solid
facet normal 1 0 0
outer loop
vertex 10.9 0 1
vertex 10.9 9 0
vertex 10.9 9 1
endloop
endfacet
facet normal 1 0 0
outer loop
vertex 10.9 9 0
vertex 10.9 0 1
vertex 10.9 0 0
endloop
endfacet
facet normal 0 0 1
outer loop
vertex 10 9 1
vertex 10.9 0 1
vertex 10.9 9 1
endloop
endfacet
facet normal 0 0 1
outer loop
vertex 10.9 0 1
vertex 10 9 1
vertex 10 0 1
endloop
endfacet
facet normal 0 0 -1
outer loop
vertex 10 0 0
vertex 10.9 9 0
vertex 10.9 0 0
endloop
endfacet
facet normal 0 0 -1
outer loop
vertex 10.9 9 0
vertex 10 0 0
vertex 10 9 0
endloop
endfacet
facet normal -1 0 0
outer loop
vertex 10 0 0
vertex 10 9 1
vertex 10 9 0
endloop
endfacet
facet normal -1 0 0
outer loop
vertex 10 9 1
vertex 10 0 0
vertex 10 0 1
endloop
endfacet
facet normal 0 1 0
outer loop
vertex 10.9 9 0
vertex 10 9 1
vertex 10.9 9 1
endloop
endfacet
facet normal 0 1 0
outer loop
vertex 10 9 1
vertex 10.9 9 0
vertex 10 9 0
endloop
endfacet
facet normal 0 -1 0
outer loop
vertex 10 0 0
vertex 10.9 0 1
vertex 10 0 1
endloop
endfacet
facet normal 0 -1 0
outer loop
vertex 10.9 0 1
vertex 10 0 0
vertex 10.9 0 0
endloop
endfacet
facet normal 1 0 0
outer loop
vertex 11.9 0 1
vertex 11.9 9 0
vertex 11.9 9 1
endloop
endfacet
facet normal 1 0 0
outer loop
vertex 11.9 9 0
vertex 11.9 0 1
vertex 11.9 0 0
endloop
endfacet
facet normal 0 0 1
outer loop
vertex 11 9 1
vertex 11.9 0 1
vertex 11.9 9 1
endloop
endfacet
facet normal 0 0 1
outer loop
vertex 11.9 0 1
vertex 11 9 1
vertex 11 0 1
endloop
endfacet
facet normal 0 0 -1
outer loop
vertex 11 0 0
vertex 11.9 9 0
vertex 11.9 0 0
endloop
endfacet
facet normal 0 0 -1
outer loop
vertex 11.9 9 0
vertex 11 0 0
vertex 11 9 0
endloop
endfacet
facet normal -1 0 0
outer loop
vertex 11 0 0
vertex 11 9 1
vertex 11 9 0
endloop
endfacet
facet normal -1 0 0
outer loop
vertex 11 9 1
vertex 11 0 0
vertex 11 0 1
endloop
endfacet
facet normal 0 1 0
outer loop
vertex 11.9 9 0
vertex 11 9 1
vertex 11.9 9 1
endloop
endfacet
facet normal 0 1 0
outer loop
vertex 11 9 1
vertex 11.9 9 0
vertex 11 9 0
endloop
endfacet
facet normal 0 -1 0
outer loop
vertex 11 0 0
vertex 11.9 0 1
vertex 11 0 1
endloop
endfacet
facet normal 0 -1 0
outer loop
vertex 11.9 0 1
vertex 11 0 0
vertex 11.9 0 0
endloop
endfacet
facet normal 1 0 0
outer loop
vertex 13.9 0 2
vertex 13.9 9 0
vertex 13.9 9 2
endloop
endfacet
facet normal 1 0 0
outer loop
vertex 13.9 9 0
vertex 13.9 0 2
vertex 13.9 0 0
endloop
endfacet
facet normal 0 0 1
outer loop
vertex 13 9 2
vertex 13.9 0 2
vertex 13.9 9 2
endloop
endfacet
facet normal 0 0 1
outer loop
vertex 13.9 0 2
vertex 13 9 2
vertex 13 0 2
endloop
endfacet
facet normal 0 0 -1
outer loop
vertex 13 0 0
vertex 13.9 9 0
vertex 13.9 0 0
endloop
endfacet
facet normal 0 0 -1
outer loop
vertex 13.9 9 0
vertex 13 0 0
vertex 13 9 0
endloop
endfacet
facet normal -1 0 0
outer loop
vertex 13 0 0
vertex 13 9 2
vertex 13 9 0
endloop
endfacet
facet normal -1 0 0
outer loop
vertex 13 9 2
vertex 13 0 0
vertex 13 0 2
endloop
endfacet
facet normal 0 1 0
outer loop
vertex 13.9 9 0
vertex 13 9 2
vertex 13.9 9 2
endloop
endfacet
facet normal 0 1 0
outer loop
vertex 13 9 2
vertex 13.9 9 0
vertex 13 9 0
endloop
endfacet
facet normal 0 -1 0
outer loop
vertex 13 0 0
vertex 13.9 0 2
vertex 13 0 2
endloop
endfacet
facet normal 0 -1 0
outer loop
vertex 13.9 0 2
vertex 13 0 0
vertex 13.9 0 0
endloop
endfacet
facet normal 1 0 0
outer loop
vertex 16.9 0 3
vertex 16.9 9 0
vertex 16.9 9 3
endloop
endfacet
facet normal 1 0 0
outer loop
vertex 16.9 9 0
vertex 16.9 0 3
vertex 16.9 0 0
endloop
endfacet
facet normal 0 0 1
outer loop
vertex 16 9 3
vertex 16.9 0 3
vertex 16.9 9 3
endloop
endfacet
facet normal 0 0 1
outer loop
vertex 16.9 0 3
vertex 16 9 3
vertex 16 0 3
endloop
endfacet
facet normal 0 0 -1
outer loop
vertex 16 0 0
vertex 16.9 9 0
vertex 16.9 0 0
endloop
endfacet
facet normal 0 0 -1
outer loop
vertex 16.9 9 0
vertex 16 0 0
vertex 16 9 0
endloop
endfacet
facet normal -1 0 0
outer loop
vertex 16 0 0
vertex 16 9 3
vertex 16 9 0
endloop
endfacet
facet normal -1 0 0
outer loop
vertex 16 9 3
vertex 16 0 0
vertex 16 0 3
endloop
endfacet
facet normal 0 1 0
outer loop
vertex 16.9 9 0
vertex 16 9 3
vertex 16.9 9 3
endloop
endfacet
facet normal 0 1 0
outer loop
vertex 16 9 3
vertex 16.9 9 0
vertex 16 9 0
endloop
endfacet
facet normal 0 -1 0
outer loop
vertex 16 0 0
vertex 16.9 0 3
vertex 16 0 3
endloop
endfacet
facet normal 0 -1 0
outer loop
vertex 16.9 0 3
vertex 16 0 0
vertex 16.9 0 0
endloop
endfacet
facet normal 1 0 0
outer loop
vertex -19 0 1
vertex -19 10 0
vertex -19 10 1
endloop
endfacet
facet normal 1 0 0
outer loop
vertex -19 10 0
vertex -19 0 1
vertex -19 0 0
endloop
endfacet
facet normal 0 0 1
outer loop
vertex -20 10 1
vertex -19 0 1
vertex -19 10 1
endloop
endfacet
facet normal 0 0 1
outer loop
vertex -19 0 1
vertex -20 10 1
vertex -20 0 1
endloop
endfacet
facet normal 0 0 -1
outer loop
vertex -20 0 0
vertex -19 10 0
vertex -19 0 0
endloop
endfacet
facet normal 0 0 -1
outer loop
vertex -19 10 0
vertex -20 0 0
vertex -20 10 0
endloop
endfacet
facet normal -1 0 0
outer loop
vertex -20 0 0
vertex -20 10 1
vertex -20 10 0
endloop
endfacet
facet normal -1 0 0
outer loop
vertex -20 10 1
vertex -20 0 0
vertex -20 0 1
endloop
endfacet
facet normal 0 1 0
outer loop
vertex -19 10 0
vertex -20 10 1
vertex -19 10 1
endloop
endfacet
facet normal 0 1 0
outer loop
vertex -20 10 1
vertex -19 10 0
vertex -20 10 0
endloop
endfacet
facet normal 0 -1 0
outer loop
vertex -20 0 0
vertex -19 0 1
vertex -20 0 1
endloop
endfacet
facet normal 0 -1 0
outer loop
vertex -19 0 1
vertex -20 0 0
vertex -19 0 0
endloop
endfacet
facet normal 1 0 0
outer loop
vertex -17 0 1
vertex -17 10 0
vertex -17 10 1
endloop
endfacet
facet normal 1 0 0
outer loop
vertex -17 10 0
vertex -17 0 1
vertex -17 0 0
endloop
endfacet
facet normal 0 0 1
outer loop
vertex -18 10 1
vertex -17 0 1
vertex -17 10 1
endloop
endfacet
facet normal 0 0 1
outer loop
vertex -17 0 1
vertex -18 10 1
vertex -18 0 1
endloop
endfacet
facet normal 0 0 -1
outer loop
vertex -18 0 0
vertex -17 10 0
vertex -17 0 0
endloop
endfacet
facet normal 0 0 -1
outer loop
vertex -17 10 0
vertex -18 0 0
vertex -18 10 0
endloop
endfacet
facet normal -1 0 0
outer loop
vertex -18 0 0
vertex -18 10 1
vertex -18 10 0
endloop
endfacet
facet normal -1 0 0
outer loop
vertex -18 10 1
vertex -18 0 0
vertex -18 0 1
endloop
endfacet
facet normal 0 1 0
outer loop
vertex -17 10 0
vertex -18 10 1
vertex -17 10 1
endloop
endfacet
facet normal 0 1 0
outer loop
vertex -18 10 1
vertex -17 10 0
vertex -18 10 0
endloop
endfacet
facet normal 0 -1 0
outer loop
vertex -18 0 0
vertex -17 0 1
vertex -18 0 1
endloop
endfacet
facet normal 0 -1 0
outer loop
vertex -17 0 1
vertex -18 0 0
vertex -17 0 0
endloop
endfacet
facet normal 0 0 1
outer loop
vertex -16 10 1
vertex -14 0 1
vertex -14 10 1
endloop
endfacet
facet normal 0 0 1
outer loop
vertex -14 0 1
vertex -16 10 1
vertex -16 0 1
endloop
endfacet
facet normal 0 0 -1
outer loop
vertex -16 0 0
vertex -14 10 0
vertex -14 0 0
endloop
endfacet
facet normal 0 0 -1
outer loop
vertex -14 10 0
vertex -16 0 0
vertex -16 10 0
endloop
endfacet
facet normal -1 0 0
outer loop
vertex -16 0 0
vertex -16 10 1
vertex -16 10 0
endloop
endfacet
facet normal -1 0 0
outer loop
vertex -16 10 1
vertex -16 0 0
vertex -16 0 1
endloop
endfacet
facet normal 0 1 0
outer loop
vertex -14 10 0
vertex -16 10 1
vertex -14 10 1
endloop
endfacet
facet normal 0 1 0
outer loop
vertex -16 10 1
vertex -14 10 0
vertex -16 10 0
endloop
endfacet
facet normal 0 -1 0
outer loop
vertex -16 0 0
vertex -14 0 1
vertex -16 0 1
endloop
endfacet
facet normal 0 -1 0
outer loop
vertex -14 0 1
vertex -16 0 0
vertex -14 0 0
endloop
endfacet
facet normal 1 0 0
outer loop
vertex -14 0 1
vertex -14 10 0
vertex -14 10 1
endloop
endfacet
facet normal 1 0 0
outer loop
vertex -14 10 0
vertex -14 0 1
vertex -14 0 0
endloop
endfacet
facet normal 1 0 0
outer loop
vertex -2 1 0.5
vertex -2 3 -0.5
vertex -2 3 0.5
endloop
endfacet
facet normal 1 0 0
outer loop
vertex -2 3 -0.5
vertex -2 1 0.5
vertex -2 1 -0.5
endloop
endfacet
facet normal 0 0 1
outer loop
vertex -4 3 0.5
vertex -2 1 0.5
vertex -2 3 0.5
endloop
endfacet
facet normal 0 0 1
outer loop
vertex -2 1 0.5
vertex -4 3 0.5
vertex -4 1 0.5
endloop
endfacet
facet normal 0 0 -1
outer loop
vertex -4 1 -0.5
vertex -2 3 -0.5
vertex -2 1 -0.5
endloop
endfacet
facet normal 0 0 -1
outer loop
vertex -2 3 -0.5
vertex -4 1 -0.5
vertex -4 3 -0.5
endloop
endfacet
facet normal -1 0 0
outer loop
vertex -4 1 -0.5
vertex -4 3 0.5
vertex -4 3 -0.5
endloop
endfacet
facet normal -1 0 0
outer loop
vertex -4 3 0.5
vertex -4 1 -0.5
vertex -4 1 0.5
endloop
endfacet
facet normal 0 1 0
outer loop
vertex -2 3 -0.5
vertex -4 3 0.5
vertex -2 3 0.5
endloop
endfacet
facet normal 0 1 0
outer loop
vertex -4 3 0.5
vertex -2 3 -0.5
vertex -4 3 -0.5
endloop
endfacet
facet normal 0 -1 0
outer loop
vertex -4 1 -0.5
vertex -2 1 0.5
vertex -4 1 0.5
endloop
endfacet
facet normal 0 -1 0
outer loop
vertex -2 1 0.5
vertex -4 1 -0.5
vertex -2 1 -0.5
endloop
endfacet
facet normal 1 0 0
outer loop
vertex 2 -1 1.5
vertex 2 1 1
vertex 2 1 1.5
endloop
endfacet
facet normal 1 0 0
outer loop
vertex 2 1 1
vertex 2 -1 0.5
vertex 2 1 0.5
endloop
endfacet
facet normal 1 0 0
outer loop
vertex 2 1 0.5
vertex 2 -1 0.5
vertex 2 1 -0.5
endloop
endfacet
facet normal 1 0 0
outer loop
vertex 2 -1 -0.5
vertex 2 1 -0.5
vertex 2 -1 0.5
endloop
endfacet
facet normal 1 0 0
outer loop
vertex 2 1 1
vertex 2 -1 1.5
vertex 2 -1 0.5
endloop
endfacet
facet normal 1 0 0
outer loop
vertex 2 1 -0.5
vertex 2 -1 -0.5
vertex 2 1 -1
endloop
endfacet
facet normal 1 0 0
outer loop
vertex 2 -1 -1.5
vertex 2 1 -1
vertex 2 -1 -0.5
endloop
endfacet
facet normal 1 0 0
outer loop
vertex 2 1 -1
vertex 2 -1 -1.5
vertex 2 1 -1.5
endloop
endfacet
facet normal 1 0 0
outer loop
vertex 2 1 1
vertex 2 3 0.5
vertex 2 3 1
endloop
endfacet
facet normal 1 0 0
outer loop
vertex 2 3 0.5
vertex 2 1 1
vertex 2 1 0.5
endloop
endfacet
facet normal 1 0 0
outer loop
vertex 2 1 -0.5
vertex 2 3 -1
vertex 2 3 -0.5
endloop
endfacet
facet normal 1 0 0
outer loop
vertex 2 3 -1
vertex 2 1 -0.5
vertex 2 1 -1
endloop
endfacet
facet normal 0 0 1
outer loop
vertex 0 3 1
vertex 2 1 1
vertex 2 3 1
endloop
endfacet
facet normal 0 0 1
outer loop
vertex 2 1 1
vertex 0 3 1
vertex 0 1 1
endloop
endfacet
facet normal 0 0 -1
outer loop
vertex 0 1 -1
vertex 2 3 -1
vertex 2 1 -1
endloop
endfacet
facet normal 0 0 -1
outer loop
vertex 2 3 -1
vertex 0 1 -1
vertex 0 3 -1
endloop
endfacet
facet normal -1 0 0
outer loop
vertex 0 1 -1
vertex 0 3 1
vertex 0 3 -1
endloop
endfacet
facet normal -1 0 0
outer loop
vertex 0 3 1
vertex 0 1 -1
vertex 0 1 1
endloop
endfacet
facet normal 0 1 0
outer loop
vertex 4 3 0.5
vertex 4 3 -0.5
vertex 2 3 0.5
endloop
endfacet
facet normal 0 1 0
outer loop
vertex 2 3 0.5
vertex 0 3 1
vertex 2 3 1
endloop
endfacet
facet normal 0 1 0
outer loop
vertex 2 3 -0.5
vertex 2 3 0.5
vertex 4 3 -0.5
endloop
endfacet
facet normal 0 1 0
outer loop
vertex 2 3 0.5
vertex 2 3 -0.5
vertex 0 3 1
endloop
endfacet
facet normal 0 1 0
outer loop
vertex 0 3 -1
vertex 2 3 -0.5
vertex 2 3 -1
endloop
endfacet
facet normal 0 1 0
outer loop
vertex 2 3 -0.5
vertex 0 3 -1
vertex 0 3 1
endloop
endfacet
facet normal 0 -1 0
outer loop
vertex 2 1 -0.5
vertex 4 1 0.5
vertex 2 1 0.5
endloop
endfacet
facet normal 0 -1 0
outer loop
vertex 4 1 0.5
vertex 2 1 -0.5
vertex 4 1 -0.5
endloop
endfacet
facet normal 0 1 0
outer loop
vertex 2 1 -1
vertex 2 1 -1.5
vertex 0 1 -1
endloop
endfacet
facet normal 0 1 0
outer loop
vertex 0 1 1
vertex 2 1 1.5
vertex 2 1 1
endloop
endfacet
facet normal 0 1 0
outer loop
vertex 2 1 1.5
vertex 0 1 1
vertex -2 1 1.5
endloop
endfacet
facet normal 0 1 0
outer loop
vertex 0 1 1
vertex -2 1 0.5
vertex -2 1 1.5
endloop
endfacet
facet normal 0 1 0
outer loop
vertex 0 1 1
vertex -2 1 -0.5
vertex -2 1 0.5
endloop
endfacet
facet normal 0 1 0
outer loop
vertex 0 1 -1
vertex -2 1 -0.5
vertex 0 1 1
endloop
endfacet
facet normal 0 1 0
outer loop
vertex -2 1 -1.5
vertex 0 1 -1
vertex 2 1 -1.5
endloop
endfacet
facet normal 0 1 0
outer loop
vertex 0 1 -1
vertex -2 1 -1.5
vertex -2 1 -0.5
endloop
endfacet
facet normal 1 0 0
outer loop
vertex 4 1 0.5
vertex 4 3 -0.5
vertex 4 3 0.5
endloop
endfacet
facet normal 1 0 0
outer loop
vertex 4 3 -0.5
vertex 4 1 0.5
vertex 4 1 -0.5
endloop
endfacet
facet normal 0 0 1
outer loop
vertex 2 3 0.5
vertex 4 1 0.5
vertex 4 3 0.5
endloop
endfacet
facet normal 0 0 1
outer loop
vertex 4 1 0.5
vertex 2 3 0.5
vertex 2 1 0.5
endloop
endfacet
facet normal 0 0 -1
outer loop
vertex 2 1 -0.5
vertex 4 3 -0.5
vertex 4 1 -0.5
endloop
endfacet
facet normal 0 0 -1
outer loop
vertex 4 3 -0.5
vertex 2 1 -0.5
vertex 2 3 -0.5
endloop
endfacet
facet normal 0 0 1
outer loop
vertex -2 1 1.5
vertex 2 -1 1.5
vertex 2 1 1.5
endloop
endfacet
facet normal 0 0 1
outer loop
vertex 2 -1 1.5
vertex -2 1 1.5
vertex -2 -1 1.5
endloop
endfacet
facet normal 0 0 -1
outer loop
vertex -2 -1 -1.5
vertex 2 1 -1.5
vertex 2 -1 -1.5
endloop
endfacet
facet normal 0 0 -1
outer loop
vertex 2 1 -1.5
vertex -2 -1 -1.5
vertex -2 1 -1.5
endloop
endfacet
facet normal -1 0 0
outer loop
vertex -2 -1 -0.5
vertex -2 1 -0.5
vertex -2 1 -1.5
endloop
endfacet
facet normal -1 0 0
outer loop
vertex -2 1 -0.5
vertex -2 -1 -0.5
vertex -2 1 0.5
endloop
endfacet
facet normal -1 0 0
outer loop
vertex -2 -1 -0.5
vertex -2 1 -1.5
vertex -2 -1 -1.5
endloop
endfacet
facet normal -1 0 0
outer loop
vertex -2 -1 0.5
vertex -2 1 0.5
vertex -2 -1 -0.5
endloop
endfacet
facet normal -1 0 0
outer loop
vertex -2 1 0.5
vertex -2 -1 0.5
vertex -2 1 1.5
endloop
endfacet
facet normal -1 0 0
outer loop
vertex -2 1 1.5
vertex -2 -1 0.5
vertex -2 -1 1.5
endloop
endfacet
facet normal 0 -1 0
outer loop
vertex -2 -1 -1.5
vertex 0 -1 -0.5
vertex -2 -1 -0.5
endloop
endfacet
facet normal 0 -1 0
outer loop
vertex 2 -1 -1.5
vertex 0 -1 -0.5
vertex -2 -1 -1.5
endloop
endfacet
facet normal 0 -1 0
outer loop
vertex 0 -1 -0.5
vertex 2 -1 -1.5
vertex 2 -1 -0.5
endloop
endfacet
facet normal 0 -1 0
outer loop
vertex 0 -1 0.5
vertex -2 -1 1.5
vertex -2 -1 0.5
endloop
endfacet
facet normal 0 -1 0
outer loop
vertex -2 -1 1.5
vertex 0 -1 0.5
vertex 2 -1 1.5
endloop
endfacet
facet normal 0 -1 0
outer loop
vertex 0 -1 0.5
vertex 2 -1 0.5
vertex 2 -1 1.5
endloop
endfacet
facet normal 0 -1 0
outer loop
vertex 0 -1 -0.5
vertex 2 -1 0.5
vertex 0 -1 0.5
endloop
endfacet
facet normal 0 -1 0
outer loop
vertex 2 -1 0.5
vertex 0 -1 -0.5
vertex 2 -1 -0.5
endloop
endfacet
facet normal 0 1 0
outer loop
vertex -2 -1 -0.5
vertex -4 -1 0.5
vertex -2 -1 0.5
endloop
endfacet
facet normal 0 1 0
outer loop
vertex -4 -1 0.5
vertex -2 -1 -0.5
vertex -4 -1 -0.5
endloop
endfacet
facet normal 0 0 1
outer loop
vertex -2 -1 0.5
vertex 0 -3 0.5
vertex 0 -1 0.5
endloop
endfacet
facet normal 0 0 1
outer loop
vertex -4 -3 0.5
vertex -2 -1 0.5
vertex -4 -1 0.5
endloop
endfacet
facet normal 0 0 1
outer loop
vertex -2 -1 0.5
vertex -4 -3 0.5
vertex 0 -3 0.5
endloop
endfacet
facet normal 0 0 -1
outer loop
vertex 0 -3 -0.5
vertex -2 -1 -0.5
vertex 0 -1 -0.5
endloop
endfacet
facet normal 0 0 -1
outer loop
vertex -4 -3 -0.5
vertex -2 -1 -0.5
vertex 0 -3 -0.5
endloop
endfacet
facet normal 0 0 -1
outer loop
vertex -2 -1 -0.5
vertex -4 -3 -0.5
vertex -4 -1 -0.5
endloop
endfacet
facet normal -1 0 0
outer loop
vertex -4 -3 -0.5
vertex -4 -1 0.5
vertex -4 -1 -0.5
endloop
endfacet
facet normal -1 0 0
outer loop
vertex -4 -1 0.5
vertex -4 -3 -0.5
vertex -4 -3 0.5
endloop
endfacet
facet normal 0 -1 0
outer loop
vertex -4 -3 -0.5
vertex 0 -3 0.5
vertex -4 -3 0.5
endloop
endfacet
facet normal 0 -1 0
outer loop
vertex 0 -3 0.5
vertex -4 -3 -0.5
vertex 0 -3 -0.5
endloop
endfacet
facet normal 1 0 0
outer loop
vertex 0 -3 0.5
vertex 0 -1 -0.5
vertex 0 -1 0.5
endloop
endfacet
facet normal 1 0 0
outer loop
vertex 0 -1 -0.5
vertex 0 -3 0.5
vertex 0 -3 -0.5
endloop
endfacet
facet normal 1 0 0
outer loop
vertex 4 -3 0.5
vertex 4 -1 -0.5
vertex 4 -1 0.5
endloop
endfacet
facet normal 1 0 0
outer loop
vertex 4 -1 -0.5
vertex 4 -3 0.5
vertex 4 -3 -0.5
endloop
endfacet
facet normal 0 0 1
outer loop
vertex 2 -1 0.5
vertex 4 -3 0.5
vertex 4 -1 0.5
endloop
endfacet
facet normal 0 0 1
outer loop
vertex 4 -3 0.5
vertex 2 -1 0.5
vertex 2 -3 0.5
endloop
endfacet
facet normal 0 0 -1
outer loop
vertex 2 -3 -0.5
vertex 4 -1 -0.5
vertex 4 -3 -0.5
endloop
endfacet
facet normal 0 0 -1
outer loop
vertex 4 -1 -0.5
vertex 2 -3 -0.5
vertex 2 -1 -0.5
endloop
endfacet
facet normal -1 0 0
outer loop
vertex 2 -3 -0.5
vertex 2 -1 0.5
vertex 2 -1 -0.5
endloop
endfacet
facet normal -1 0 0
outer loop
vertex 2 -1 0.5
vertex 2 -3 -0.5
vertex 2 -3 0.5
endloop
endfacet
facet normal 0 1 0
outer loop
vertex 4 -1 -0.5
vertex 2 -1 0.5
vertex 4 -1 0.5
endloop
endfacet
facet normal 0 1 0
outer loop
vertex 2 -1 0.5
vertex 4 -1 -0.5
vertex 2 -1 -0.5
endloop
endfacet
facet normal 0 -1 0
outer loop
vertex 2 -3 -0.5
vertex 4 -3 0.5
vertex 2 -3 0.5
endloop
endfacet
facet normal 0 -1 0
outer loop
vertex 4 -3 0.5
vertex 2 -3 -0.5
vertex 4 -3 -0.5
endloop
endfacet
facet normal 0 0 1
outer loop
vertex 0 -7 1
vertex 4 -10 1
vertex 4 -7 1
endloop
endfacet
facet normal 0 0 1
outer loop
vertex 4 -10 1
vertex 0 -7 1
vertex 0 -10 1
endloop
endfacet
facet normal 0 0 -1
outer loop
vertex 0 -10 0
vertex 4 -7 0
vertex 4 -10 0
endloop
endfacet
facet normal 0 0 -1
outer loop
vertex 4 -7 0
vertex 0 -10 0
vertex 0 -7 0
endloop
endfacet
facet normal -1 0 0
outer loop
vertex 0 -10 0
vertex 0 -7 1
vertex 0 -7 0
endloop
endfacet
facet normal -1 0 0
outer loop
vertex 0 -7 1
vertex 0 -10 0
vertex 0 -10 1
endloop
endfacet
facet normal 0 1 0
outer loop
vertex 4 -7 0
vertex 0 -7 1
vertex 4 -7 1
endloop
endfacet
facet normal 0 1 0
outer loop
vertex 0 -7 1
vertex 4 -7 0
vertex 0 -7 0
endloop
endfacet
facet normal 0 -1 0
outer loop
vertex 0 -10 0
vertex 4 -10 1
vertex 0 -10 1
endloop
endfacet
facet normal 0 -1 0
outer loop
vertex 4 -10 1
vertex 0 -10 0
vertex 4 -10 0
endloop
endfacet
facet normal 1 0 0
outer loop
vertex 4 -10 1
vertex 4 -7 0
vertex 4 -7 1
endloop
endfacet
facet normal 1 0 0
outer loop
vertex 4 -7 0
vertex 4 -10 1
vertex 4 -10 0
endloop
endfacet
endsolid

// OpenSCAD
/*****************************************************************************
 * Module Bitmap Library
 * Modules to create bitmaps of unit squares from 1 or 2 dimensional vectors.
 *****************************************************************************
 * Copyright 2017 Chris Baker
 *
 * This program is free software: you can redistribute it and/or modify
 * it under the terms of the GNU Lesser General Public License as published by
 * the Free Software Foundation, either version 3 of the License, or
 * (at your option) any later version.
 *
 * This program is distributed in the hope that it will be useful,
 * but WITHOUT ANY WARRANTY; without even the implied warranty of
 * MERCHANTABILITY or FITNESS FOR A PARTICULAR PURPOSE.  See the
 * GNU Lesser General Public License for more details.
 *
 * You should have received a copy of the GNU Lesser General Public License
 * along with this program.  If not, see <http://www.gnu.org/licenses/>.
 *****************************************************************************
 * Usage:
 * Include this file with the "use" tag.
 * Depends on compat.scad library.
 *
 * API:
 *   1dbitmap(bitmap, center, expansion, vector_mode)
 *   2dbitmap(bitmap, center, expansion, vector_mode)
 *     Generate a 1 or 2-Dimensional field of modules based on the provided
 *     bitmap vector. See Bitmap Vectors below.
 *     The center flag determines whether to center the bitmap on the origin.
 *     The expansion value actually shrinks each cube in the x and y
 *     dimension by the specified amount.
 *     The vector_mode flag determines whether to create 3D solid geometry
 *     (unit cubes) or 2D vector geometry (squares).
 *
 * Bitmap Vectors:
 *   The bitmap vectors primarily provide boolean information.
 *   A module will be placed where these vectors have a postive value and
 *   skipped where they have a negative value. I.E. 0, -1, false, and undef
 *   are all equivalent and result in a skip. 1 and true are equivalent and
 *   result in a placed 1-unit module.
 *   Further, if the value is an integer it will be treated as a height for
 *   the module, allowing z-maps to be created.
 *   If the value is not an integer or boolean, it will be treated as a color
 *   reference. This can be a string or RGBA vector that will be used to
 *   color the module in the OpenSCAD preview window.
 *   In current versions of OpenSCAD, the color has no effect in the rendered
 *   view or STL output.
 *
 * Vector Mode:
 *   Although OpenSCAD supports generating 2D geometry, there are several
 *   caveats:
 *   - 2D and 3D geometry cannot be mixed
 *   - Extruding 2D geometry causes color information to be lost
 *   - All 2D geometry is projected onto the XY plane when rendering
 *   - Rendering also results in loss of color (same as 3D)
 *   - The SVG exporter is somewhat limited:
 *     - The pixel size of the image is hard-coded in the file
 *     - The title of the image is a generic string
 *     - The color selection for stroke and fill is fixed
 *     - The stroke-width is set to a large value that will cause overlap
 *     - The background is transparent
 *     - Only one path element is created with all of the geometry; there is
 *       no easy way to split up the geometry into multiple logical units.
 *     - These issues can mostly be resolved by hand-editing the file:
 *       - Remove or modify the width and height parameters from the svg
 *         element at the top of the file to provide better scaling.
 *       - Edit the title element at the top of the file to change the title.
 *       - Edit the stroke and fill parameters of the path element (these will
 *         probably be at the end of the file).
 *       - Set the stroke-width parameter for the path element to 0.
 *****************************************************************************/
use <compat.scad>

/*
 * 2dbitmap - Turn a 2D vector into a bitmap of cubes
 *
 * bitmap - 2D vector representing where to place each cube
 *          Value can either be boolean, z-height, or color
 * center - center cubes around the origin
 * expansion - size of gap around each pixel (screendoor)
 * vector_mode - create a 2D vector drawing instead of 3D extrusion
 */
module 2dbitmap(bitmap=[[1,0],[0,1]], center=false, expansion=0, vector_mode=false)
{
	ylen=len(bitmap)-1;

	for (y=[0:ylen]) {
		xlen=len(bitmap[y])-1;
		for (x=[0:xlen])
			translate([x-(center?xlen/2:0),ylen-y-(center?ylen/2:0),0])
				if (is_indexable(bitmap[y][x]))
					color(bitmap[y][x])
						if (vector_mode)
							square([1-expansion,1-expansion], center=center);
						else
							cube([1-expansion,1-expansion,1], center=center);
				else
					if (bitmap[y][x])
						if (vector_mode)
							square([1-expansion,1-expansion], center=center);
						else
							cube([1-expansion,1-expansion,clamp_nonnum(bitmap[y][x])], center=center);
	}
}

module 1dbitmap(bitmap=[1,0,1,0,1], center=false, expansion=0, vector_mode=false)
	2dbitmap([bitmap], center, expansion, vector_mode);

/*
 * Examples
 */

// 1D with z-height
translate([10,0,0]) scale([1,10,1])
	1dbitmap(bitmap=[1,1,0,2,0,0,3], expansion=.1);

// 1D with boolean
translate([-20,0,0]) scale([1,10,1])
	1dbitmap(bitmap=[true,false,true,false,true,true]);

// 2D with z-height
scale([2,2,1])
	2dbitmap(bitmap=[[1,0,2,1],[0,3,3,0],[1,1,0,1]],
		center=true);

// 1D with color
translate([0,-10,0]) scale([1,3,1])
	1dbitmap(bitmap=["red","white","blue",[0,0.3,0,0.5]]);

// 1D with color using 2D-vector-mode
translate([-7,-8,0]) scale([1,2])
	1dbitmap(bitmap=["red",0,"blue",0,"green"], vector_mode=true);
translate([-4.5,-10,0]) scale([1,2])
	1dbitmap(bitmap=["red",0,"blue",0,"green"], vector_mode=true, center=true);
